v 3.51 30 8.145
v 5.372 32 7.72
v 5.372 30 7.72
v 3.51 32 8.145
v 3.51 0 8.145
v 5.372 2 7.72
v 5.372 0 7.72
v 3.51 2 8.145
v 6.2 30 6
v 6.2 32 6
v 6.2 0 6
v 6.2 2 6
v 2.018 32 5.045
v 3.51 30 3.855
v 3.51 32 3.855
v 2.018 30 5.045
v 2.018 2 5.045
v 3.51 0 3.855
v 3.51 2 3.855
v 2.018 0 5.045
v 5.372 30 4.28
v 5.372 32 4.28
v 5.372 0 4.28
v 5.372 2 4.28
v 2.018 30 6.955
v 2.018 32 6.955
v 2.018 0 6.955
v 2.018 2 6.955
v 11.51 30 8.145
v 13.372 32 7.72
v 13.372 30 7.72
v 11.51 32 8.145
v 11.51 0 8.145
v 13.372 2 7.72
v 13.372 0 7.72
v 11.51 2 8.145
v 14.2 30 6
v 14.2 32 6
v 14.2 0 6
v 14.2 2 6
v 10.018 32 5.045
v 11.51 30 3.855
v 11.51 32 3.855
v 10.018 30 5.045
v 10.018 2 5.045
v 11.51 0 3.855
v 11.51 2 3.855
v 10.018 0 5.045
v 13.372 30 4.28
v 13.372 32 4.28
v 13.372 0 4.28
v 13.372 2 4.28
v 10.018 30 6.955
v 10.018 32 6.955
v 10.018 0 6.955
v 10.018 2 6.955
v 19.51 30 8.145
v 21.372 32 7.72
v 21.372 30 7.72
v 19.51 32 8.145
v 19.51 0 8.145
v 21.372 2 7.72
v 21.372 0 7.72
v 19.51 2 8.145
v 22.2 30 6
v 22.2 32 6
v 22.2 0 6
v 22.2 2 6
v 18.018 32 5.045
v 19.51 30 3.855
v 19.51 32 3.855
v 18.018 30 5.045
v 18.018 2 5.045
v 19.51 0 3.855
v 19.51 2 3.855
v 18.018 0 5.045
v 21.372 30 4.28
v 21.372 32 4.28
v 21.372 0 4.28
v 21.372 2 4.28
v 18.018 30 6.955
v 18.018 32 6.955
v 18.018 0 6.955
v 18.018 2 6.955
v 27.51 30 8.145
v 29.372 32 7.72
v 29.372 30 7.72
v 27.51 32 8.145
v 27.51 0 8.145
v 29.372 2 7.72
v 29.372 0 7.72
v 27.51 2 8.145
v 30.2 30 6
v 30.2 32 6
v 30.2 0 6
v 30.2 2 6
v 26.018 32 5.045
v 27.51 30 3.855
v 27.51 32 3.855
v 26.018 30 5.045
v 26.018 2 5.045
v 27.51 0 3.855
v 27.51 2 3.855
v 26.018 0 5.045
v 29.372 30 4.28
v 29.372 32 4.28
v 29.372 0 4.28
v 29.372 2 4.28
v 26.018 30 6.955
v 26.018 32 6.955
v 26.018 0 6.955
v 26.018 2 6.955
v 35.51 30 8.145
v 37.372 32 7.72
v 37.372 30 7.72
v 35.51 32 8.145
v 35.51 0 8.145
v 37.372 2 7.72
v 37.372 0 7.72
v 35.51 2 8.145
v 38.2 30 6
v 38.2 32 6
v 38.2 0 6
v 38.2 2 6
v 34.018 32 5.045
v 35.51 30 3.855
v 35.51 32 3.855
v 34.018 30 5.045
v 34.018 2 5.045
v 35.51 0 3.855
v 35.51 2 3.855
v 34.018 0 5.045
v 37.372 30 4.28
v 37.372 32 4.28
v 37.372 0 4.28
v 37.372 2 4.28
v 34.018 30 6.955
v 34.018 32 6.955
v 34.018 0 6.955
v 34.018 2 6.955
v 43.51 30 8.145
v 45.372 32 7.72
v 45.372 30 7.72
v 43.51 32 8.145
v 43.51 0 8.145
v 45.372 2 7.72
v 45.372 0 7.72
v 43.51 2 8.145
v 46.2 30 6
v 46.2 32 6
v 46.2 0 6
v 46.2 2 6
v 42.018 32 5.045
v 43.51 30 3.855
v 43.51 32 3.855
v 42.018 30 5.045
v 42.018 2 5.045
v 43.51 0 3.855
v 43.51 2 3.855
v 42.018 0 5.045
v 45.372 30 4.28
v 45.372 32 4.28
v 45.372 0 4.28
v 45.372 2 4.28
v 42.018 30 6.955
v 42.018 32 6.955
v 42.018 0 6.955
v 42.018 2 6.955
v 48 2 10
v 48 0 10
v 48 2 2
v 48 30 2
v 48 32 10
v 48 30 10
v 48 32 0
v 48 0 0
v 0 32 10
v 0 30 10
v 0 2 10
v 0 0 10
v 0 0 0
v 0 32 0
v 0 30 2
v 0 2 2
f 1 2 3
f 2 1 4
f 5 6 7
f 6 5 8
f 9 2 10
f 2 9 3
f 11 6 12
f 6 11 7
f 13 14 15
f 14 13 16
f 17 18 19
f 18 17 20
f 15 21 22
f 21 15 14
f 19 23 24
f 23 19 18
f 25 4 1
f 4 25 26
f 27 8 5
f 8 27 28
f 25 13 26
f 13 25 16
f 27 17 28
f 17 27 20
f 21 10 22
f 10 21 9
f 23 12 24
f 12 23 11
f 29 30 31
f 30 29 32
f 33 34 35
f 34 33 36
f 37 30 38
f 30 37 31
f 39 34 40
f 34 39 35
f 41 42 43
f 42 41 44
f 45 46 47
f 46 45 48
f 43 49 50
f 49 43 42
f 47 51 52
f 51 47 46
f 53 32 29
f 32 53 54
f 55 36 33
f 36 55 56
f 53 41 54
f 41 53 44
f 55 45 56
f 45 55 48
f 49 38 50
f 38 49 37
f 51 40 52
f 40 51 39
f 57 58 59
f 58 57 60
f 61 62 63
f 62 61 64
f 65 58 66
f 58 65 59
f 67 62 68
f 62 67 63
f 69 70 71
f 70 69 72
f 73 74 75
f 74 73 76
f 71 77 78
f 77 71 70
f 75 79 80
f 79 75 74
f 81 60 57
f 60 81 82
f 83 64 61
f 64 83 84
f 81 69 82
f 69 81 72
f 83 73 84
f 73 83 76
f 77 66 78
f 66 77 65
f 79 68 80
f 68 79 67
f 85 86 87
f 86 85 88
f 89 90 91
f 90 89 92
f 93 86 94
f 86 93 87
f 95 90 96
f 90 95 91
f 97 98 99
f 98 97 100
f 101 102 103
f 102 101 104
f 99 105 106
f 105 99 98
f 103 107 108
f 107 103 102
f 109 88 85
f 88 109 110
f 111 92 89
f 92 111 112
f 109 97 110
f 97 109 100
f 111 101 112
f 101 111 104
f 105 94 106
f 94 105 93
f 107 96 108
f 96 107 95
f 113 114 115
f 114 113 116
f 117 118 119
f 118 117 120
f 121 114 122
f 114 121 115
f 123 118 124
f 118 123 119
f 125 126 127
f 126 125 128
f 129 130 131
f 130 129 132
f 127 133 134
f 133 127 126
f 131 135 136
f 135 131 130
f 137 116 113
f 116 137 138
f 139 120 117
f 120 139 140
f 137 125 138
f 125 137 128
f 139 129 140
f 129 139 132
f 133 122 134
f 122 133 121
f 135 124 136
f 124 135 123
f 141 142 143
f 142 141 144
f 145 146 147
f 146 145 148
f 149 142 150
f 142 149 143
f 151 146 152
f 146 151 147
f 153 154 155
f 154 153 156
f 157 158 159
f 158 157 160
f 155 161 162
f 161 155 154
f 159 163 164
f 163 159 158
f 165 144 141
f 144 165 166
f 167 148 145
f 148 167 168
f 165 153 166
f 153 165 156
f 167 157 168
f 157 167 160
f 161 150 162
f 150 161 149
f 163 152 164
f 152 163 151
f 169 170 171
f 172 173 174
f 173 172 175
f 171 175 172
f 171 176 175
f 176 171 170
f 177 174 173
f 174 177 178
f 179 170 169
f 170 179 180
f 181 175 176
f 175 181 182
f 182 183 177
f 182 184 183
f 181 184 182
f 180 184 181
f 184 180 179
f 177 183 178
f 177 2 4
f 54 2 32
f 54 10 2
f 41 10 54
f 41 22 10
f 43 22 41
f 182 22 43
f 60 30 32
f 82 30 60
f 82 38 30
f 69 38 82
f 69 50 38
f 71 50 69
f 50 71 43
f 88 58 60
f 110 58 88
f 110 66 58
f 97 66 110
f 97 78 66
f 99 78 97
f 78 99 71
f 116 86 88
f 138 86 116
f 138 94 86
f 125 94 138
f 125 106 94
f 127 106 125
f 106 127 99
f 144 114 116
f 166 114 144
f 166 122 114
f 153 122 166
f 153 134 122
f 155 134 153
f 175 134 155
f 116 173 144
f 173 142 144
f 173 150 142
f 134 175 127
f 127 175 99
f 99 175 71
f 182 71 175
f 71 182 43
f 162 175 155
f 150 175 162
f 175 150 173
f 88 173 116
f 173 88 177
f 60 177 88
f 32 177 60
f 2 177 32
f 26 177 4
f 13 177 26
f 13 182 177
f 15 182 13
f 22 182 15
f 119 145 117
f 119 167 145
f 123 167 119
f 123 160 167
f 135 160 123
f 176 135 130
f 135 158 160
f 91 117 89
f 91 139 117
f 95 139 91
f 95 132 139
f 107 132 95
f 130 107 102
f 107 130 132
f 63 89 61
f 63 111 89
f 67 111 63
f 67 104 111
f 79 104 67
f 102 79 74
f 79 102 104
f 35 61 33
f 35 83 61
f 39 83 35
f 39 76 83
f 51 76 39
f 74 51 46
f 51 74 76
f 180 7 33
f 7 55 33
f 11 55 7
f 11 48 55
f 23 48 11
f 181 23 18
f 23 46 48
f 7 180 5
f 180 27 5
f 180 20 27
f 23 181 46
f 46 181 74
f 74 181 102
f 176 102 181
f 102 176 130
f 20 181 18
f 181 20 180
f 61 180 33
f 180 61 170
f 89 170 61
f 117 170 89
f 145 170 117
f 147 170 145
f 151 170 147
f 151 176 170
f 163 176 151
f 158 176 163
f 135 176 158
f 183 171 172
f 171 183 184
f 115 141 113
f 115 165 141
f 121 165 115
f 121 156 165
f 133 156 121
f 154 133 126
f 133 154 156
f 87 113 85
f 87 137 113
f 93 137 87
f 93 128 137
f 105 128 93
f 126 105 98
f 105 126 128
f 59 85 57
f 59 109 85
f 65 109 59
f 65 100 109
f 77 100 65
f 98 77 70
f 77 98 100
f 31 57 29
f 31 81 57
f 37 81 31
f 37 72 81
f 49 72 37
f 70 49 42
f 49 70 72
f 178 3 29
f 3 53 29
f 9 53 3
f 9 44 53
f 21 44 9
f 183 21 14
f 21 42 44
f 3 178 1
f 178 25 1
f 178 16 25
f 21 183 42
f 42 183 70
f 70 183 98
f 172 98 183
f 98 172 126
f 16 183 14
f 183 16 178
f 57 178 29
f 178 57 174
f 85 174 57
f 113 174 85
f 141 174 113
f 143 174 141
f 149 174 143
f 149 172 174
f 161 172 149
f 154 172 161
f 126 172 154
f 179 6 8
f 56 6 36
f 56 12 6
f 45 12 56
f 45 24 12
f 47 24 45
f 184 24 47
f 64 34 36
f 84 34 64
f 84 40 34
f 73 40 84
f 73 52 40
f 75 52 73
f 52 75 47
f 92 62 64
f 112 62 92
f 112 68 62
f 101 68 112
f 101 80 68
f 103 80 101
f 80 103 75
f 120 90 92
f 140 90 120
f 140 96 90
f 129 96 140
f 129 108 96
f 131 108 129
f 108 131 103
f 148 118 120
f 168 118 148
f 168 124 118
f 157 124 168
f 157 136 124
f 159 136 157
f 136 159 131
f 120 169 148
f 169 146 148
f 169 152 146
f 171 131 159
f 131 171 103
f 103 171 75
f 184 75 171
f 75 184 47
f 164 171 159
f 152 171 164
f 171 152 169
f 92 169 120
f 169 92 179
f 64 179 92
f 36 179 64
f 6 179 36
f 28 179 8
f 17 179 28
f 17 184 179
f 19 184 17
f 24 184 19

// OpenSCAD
// configuration
space = 4;
hole = 4;
pad = 2;
length = 6;
width = 4;

l = length*hole + (length-1)*space + 2*pad;
w = width*hole + (width-1)*space + 2*pad;
h = hole + 3*pad;

difference() {
    
    // total piece
    cube([l, w, h]);
    
    // hollow internal
    translate([-pad, pad, pad]) {
        cube([l + 2*pad, w - 2*pad, h]);
    };
    
    // horizontal holes
    for(i=[1:length]) {
        translate([
            i*hole + (i - 1)*space - hole/2 + pad,
            w/2,
            2*pad + hole/2
        ]) {
            rotate([90, 0, 0]) {
                translate([0, 0, -w/2 -pad]) {
                    cylinder(h=w + 2*pad, r=hole/2 + 0.2);
                };
            };
        };
    };
};
